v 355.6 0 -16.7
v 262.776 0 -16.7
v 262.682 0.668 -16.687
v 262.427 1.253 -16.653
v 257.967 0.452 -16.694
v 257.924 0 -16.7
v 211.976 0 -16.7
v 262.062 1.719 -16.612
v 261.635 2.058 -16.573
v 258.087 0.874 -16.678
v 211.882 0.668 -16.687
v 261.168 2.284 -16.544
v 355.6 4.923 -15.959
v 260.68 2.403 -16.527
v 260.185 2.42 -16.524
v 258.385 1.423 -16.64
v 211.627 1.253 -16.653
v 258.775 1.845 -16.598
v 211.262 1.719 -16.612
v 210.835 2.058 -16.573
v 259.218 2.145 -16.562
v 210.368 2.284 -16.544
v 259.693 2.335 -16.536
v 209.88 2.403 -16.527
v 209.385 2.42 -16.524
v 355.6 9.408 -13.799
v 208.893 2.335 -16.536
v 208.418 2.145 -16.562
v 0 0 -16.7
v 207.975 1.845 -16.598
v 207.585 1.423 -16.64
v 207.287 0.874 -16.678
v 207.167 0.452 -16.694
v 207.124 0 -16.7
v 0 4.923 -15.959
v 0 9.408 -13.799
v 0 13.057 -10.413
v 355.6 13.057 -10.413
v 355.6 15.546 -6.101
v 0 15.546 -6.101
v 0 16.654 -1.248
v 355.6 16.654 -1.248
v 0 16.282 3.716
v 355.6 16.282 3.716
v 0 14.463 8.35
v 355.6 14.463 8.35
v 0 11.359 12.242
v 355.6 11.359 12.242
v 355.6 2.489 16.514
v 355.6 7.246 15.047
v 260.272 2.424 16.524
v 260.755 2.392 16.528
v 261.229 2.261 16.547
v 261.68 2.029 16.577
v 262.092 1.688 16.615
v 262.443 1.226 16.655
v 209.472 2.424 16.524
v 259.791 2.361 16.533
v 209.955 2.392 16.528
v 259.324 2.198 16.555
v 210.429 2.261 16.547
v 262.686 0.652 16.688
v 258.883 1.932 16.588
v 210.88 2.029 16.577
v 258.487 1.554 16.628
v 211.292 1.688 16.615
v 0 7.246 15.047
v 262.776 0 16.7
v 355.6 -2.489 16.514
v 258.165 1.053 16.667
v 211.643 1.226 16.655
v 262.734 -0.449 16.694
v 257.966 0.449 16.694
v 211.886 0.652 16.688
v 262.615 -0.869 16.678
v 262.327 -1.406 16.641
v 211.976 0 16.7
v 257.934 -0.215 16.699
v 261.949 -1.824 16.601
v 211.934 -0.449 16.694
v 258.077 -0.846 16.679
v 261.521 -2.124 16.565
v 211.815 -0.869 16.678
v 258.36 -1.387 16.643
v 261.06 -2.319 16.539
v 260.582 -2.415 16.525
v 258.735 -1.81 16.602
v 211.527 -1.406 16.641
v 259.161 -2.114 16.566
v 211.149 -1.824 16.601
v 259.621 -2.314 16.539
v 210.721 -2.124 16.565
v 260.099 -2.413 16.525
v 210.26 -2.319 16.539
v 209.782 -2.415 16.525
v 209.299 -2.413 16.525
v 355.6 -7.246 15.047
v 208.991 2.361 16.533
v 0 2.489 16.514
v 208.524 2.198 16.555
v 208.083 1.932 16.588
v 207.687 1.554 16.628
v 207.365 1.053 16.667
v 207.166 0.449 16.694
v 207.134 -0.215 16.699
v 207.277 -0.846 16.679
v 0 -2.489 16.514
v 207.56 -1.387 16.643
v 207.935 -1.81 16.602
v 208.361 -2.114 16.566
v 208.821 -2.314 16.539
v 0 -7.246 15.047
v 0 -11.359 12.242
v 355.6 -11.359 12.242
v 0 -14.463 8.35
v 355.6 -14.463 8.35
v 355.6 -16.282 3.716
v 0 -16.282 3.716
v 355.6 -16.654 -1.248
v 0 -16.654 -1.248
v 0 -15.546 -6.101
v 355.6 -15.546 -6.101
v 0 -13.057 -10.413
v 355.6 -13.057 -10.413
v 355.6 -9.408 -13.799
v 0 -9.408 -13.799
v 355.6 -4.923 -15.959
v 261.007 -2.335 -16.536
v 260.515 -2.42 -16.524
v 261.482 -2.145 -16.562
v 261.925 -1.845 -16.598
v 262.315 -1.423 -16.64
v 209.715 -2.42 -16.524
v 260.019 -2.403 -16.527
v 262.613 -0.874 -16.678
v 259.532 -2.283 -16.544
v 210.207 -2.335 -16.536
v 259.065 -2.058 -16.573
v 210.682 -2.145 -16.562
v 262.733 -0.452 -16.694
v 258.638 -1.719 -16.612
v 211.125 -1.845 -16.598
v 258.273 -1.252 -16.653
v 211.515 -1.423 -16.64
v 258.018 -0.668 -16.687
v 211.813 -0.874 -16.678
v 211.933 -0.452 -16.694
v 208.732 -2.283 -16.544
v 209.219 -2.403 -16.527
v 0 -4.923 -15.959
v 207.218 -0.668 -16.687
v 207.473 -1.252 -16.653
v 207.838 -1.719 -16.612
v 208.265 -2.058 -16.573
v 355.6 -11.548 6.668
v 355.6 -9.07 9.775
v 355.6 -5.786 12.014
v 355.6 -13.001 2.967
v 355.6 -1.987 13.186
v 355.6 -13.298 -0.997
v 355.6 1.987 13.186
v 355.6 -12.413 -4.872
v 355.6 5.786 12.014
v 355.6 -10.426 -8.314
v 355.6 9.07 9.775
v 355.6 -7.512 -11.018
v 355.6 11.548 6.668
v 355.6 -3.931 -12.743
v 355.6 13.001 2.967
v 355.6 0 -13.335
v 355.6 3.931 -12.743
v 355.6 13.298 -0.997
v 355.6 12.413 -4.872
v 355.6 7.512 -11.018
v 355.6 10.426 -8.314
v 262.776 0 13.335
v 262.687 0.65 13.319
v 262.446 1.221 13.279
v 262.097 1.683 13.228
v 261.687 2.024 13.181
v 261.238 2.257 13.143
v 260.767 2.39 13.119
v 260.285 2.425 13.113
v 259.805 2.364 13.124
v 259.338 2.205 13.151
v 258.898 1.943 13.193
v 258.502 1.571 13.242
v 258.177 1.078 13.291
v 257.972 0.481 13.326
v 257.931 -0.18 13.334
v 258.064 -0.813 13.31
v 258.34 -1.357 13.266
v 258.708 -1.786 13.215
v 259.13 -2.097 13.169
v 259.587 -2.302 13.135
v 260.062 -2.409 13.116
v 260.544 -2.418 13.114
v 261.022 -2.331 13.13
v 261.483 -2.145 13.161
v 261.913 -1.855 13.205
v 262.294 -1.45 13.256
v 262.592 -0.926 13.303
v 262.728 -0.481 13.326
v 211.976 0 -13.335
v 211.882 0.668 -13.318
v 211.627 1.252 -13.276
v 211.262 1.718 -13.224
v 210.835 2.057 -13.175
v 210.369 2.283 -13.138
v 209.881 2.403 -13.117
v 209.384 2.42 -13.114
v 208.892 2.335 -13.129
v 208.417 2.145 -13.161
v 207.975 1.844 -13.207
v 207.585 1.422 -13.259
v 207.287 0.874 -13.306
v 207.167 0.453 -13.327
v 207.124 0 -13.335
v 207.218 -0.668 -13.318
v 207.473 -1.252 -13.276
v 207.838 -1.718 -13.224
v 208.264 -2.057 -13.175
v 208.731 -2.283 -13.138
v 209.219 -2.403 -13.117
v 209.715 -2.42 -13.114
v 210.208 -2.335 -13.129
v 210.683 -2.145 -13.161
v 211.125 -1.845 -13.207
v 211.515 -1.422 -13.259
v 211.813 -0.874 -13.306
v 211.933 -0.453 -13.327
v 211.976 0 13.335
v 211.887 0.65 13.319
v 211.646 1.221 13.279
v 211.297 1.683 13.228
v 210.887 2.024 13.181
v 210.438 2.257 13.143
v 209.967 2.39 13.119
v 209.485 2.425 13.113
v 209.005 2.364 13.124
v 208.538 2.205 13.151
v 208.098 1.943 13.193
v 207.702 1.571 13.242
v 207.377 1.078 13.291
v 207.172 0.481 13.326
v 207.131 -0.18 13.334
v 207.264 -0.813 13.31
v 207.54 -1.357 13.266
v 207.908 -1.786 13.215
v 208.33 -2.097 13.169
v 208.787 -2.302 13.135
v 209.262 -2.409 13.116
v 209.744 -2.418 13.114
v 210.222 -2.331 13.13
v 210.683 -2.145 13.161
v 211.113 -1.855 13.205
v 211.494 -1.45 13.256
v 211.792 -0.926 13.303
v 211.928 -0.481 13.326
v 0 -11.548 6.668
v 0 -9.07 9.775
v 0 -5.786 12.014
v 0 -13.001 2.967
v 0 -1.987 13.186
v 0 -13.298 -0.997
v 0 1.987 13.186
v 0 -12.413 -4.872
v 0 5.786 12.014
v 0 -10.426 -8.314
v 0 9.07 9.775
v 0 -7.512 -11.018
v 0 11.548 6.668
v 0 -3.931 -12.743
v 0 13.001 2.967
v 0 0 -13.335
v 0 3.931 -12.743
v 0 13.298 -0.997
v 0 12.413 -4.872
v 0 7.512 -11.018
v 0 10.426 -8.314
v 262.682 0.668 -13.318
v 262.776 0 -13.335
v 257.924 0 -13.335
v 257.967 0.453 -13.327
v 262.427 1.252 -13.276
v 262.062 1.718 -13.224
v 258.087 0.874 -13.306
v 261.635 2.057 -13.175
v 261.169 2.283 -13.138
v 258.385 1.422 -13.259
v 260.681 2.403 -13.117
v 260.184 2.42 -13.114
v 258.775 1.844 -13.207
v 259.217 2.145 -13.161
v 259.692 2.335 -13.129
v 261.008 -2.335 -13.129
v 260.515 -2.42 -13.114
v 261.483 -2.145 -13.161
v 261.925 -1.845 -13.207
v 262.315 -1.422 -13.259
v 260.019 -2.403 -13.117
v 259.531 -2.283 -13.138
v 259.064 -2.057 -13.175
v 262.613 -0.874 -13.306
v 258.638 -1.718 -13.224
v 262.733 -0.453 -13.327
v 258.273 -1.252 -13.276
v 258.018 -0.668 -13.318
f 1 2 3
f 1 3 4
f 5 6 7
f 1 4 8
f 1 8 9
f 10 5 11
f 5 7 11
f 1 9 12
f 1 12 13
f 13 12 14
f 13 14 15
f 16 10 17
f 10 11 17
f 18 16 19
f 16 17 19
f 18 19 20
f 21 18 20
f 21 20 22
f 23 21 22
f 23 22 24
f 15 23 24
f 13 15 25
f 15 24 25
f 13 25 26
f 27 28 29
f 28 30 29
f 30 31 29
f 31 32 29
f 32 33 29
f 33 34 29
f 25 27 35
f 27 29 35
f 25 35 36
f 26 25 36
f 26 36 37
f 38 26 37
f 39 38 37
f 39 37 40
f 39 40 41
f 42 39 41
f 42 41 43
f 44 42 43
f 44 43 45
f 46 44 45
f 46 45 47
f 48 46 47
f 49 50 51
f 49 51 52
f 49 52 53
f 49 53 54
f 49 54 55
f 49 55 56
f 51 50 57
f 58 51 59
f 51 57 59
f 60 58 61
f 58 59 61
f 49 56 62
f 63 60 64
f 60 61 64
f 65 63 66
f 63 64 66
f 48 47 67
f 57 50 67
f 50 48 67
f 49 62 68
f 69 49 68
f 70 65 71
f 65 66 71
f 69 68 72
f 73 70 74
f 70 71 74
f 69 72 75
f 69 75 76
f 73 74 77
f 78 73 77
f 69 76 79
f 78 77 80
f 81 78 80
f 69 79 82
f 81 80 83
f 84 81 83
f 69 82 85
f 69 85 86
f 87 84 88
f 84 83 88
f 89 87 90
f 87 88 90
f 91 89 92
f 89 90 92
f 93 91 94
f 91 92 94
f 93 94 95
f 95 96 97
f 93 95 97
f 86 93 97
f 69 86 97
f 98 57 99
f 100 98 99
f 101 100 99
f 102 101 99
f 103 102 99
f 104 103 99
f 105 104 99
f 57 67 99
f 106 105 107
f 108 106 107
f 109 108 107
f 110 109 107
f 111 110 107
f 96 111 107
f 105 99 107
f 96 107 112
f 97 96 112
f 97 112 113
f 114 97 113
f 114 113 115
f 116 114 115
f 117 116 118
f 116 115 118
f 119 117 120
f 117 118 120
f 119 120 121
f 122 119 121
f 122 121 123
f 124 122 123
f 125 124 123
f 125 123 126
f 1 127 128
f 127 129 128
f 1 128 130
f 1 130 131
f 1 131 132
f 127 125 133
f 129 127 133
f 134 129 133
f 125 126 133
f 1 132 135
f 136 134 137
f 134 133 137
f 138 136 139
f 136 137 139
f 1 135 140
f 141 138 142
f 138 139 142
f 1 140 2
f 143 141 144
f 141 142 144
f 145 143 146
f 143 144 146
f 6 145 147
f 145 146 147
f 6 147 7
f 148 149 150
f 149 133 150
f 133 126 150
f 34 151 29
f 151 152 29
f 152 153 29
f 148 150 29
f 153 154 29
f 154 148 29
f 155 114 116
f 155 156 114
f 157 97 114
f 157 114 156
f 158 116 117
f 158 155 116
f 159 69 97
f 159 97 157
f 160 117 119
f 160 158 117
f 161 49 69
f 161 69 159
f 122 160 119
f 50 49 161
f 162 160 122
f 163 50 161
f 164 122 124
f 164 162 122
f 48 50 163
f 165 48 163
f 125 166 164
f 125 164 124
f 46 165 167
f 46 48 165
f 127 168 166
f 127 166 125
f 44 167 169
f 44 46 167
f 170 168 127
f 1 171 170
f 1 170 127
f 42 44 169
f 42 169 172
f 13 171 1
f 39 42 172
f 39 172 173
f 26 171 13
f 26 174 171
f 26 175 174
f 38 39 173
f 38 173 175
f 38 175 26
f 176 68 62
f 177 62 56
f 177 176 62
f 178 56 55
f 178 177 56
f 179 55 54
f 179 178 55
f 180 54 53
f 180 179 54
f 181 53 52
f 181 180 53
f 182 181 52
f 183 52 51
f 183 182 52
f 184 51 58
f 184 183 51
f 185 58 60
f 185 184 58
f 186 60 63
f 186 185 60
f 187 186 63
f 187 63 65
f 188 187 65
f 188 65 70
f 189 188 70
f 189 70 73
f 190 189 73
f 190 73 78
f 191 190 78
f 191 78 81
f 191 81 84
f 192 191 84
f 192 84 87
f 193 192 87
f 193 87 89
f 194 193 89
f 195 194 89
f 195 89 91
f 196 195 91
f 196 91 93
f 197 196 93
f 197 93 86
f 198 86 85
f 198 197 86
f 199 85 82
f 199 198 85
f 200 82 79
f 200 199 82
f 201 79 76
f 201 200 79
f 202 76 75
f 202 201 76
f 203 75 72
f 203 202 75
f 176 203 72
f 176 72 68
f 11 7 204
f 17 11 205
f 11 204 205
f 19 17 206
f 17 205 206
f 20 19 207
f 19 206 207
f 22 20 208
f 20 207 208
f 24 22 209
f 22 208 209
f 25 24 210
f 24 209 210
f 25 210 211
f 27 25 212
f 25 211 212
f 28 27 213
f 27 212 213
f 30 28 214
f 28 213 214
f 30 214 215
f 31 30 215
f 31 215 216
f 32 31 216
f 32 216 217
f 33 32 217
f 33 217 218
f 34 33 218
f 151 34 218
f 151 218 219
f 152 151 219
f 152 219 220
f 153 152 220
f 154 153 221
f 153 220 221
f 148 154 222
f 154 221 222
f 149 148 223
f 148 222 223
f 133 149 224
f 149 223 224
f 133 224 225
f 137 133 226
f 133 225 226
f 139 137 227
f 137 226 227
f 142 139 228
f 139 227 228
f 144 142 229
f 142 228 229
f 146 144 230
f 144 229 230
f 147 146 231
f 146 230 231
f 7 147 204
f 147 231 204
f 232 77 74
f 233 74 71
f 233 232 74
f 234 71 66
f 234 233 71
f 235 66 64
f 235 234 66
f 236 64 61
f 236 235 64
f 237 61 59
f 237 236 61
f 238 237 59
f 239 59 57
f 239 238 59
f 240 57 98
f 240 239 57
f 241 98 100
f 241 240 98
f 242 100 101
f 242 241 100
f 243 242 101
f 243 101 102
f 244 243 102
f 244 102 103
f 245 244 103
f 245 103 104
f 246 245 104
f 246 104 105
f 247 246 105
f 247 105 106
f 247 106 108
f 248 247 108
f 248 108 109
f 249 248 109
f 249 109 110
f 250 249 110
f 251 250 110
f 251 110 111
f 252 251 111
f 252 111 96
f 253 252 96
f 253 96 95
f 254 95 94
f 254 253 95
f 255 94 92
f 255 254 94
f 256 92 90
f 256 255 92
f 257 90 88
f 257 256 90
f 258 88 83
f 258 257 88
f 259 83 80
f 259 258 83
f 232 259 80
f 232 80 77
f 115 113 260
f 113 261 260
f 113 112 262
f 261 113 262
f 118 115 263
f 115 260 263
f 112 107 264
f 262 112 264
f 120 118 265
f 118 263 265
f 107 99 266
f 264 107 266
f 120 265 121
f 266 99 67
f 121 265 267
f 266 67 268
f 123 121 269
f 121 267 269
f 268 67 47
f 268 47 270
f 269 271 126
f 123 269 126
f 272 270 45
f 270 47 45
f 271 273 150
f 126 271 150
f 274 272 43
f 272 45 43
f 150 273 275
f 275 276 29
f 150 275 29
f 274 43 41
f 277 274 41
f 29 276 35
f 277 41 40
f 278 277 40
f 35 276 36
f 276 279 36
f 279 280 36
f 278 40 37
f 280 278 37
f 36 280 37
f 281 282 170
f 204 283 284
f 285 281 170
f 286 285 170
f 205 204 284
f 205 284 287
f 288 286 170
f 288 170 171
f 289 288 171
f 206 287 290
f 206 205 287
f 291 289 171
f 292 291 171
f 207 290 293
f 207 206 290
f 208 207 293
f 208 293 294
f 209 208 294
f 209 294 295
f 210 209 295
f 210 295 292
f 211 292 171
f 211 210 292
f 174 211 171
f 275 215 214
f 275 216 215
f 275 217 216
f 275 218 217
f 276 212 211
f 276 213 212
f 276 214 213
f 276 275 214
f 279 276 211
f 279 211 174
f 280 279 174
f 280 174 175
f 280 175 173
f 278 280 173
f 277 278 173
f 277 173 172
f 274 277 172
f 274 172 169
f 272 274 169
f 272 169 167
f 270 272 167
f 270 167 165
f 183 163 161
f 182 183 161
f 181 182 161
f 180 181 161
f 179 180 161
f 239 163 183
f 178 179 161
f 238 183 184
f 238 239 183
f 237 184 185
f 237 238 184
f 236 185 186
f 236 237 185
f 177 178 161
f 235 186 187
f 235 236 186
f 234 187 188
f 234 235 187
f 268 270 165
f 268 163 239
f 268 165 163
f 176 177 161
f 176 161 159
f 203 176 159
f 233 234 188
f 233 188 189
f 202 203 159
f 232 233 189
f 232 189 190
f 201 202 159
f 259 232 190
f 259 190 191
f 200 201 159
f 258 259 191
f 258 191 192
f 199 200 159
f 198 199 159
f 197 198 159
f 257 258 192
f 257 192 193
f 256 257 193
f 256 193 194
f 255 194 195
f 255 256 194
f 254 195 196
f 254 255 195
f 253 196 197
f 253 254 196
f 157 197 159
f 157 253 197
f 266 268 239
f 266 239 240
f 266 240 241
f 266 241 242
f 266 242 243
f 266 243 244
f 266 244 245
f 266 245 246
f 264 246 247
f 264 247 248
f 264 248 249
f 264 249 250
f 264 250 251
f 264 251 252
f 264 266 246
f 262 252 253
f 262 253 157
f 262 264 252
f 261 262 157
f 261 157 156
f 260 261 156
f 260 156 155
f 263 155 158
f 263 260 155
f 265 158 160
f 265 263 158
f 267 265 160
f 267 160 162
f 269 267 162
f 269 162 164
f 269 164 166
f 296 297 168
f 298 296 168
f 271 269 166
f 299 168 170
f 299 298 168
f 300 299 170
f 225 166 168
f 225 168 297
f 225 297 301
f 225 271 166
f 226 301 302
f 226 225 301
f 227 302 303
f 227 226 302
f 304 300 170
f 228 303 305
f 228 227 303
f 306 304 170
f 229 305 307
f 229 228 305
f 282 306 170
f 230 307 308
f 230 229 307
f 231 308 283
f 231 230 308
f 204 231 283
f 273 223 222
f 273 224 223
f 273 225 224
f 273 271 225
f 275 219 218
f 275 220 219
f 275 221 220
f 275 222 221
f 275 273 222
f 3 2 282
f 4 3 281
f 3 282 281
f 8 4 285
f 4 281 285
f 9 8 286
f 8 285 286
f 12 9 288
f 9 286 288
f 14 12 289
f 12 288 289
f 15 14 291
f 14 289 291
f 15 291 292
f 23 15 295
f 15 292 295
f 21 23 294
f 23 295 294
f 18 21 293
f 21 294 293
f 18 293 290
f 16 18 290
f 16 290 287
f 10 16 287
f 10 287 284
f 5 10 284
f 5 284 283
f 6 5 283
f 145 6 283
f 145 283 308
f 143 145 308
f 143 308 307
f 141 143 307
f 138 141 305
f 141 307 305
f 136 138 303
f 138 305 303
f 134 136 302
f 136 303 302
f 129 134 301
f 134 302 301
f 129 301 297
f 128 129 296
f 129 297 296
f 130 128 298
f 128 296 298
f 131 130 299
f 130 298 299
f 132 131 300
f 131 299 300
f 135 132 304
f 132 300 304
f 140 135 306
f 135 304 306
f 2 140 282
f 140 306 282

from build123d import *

# Parameters (mm, degrees)
SKETCH1_R               = 16.7005
SKETCH1_R_2             = 13.335
BOSS_EXTRUDE1_DEPTH     = 355.6
SKETCH2_R               = 2.4257
CUT_EXTRUDE1_DEPTH      = 17.7005
CUT_EXTRUDE1_DEPTH_BACK = 17.7005


with BuildPart() as part:
    # Sketch1 → Boss-Extrude1 (new body)
    with BuildSketch(Plane(origin=(0, 0, 0), x_dir=(0, 0, -1), z_dir=(1, 0, 0))):
        Circle(SKETCH1_R)
        Circle(SKETCH1_R_2, mode=Mode.SUBTRACT)
    extrude(amount=BOSS_EXTRUDE1_DEPTH)

    # Sketch2 → Cut-Extrude1 (cut, two sides)
    with BuildSketch(Plane.XY) as cut_extrude1_sk:
        with Locations((209.55, 0)):
            Circle(SKETCH2_R)
        with Locations((260.35, 0)):
            Circle(SKETCH2_R)
    extrude(amount=CUT_EXTRUDE1_DEPTH, mode=Mode.SUBTRACT)
    extrude(cut_extrude1_sk.sketch, amount=-CUT_EXTRUDE1_DEPTH_BACK, mode=Mode.SUBTRACT)


solid = part.part
